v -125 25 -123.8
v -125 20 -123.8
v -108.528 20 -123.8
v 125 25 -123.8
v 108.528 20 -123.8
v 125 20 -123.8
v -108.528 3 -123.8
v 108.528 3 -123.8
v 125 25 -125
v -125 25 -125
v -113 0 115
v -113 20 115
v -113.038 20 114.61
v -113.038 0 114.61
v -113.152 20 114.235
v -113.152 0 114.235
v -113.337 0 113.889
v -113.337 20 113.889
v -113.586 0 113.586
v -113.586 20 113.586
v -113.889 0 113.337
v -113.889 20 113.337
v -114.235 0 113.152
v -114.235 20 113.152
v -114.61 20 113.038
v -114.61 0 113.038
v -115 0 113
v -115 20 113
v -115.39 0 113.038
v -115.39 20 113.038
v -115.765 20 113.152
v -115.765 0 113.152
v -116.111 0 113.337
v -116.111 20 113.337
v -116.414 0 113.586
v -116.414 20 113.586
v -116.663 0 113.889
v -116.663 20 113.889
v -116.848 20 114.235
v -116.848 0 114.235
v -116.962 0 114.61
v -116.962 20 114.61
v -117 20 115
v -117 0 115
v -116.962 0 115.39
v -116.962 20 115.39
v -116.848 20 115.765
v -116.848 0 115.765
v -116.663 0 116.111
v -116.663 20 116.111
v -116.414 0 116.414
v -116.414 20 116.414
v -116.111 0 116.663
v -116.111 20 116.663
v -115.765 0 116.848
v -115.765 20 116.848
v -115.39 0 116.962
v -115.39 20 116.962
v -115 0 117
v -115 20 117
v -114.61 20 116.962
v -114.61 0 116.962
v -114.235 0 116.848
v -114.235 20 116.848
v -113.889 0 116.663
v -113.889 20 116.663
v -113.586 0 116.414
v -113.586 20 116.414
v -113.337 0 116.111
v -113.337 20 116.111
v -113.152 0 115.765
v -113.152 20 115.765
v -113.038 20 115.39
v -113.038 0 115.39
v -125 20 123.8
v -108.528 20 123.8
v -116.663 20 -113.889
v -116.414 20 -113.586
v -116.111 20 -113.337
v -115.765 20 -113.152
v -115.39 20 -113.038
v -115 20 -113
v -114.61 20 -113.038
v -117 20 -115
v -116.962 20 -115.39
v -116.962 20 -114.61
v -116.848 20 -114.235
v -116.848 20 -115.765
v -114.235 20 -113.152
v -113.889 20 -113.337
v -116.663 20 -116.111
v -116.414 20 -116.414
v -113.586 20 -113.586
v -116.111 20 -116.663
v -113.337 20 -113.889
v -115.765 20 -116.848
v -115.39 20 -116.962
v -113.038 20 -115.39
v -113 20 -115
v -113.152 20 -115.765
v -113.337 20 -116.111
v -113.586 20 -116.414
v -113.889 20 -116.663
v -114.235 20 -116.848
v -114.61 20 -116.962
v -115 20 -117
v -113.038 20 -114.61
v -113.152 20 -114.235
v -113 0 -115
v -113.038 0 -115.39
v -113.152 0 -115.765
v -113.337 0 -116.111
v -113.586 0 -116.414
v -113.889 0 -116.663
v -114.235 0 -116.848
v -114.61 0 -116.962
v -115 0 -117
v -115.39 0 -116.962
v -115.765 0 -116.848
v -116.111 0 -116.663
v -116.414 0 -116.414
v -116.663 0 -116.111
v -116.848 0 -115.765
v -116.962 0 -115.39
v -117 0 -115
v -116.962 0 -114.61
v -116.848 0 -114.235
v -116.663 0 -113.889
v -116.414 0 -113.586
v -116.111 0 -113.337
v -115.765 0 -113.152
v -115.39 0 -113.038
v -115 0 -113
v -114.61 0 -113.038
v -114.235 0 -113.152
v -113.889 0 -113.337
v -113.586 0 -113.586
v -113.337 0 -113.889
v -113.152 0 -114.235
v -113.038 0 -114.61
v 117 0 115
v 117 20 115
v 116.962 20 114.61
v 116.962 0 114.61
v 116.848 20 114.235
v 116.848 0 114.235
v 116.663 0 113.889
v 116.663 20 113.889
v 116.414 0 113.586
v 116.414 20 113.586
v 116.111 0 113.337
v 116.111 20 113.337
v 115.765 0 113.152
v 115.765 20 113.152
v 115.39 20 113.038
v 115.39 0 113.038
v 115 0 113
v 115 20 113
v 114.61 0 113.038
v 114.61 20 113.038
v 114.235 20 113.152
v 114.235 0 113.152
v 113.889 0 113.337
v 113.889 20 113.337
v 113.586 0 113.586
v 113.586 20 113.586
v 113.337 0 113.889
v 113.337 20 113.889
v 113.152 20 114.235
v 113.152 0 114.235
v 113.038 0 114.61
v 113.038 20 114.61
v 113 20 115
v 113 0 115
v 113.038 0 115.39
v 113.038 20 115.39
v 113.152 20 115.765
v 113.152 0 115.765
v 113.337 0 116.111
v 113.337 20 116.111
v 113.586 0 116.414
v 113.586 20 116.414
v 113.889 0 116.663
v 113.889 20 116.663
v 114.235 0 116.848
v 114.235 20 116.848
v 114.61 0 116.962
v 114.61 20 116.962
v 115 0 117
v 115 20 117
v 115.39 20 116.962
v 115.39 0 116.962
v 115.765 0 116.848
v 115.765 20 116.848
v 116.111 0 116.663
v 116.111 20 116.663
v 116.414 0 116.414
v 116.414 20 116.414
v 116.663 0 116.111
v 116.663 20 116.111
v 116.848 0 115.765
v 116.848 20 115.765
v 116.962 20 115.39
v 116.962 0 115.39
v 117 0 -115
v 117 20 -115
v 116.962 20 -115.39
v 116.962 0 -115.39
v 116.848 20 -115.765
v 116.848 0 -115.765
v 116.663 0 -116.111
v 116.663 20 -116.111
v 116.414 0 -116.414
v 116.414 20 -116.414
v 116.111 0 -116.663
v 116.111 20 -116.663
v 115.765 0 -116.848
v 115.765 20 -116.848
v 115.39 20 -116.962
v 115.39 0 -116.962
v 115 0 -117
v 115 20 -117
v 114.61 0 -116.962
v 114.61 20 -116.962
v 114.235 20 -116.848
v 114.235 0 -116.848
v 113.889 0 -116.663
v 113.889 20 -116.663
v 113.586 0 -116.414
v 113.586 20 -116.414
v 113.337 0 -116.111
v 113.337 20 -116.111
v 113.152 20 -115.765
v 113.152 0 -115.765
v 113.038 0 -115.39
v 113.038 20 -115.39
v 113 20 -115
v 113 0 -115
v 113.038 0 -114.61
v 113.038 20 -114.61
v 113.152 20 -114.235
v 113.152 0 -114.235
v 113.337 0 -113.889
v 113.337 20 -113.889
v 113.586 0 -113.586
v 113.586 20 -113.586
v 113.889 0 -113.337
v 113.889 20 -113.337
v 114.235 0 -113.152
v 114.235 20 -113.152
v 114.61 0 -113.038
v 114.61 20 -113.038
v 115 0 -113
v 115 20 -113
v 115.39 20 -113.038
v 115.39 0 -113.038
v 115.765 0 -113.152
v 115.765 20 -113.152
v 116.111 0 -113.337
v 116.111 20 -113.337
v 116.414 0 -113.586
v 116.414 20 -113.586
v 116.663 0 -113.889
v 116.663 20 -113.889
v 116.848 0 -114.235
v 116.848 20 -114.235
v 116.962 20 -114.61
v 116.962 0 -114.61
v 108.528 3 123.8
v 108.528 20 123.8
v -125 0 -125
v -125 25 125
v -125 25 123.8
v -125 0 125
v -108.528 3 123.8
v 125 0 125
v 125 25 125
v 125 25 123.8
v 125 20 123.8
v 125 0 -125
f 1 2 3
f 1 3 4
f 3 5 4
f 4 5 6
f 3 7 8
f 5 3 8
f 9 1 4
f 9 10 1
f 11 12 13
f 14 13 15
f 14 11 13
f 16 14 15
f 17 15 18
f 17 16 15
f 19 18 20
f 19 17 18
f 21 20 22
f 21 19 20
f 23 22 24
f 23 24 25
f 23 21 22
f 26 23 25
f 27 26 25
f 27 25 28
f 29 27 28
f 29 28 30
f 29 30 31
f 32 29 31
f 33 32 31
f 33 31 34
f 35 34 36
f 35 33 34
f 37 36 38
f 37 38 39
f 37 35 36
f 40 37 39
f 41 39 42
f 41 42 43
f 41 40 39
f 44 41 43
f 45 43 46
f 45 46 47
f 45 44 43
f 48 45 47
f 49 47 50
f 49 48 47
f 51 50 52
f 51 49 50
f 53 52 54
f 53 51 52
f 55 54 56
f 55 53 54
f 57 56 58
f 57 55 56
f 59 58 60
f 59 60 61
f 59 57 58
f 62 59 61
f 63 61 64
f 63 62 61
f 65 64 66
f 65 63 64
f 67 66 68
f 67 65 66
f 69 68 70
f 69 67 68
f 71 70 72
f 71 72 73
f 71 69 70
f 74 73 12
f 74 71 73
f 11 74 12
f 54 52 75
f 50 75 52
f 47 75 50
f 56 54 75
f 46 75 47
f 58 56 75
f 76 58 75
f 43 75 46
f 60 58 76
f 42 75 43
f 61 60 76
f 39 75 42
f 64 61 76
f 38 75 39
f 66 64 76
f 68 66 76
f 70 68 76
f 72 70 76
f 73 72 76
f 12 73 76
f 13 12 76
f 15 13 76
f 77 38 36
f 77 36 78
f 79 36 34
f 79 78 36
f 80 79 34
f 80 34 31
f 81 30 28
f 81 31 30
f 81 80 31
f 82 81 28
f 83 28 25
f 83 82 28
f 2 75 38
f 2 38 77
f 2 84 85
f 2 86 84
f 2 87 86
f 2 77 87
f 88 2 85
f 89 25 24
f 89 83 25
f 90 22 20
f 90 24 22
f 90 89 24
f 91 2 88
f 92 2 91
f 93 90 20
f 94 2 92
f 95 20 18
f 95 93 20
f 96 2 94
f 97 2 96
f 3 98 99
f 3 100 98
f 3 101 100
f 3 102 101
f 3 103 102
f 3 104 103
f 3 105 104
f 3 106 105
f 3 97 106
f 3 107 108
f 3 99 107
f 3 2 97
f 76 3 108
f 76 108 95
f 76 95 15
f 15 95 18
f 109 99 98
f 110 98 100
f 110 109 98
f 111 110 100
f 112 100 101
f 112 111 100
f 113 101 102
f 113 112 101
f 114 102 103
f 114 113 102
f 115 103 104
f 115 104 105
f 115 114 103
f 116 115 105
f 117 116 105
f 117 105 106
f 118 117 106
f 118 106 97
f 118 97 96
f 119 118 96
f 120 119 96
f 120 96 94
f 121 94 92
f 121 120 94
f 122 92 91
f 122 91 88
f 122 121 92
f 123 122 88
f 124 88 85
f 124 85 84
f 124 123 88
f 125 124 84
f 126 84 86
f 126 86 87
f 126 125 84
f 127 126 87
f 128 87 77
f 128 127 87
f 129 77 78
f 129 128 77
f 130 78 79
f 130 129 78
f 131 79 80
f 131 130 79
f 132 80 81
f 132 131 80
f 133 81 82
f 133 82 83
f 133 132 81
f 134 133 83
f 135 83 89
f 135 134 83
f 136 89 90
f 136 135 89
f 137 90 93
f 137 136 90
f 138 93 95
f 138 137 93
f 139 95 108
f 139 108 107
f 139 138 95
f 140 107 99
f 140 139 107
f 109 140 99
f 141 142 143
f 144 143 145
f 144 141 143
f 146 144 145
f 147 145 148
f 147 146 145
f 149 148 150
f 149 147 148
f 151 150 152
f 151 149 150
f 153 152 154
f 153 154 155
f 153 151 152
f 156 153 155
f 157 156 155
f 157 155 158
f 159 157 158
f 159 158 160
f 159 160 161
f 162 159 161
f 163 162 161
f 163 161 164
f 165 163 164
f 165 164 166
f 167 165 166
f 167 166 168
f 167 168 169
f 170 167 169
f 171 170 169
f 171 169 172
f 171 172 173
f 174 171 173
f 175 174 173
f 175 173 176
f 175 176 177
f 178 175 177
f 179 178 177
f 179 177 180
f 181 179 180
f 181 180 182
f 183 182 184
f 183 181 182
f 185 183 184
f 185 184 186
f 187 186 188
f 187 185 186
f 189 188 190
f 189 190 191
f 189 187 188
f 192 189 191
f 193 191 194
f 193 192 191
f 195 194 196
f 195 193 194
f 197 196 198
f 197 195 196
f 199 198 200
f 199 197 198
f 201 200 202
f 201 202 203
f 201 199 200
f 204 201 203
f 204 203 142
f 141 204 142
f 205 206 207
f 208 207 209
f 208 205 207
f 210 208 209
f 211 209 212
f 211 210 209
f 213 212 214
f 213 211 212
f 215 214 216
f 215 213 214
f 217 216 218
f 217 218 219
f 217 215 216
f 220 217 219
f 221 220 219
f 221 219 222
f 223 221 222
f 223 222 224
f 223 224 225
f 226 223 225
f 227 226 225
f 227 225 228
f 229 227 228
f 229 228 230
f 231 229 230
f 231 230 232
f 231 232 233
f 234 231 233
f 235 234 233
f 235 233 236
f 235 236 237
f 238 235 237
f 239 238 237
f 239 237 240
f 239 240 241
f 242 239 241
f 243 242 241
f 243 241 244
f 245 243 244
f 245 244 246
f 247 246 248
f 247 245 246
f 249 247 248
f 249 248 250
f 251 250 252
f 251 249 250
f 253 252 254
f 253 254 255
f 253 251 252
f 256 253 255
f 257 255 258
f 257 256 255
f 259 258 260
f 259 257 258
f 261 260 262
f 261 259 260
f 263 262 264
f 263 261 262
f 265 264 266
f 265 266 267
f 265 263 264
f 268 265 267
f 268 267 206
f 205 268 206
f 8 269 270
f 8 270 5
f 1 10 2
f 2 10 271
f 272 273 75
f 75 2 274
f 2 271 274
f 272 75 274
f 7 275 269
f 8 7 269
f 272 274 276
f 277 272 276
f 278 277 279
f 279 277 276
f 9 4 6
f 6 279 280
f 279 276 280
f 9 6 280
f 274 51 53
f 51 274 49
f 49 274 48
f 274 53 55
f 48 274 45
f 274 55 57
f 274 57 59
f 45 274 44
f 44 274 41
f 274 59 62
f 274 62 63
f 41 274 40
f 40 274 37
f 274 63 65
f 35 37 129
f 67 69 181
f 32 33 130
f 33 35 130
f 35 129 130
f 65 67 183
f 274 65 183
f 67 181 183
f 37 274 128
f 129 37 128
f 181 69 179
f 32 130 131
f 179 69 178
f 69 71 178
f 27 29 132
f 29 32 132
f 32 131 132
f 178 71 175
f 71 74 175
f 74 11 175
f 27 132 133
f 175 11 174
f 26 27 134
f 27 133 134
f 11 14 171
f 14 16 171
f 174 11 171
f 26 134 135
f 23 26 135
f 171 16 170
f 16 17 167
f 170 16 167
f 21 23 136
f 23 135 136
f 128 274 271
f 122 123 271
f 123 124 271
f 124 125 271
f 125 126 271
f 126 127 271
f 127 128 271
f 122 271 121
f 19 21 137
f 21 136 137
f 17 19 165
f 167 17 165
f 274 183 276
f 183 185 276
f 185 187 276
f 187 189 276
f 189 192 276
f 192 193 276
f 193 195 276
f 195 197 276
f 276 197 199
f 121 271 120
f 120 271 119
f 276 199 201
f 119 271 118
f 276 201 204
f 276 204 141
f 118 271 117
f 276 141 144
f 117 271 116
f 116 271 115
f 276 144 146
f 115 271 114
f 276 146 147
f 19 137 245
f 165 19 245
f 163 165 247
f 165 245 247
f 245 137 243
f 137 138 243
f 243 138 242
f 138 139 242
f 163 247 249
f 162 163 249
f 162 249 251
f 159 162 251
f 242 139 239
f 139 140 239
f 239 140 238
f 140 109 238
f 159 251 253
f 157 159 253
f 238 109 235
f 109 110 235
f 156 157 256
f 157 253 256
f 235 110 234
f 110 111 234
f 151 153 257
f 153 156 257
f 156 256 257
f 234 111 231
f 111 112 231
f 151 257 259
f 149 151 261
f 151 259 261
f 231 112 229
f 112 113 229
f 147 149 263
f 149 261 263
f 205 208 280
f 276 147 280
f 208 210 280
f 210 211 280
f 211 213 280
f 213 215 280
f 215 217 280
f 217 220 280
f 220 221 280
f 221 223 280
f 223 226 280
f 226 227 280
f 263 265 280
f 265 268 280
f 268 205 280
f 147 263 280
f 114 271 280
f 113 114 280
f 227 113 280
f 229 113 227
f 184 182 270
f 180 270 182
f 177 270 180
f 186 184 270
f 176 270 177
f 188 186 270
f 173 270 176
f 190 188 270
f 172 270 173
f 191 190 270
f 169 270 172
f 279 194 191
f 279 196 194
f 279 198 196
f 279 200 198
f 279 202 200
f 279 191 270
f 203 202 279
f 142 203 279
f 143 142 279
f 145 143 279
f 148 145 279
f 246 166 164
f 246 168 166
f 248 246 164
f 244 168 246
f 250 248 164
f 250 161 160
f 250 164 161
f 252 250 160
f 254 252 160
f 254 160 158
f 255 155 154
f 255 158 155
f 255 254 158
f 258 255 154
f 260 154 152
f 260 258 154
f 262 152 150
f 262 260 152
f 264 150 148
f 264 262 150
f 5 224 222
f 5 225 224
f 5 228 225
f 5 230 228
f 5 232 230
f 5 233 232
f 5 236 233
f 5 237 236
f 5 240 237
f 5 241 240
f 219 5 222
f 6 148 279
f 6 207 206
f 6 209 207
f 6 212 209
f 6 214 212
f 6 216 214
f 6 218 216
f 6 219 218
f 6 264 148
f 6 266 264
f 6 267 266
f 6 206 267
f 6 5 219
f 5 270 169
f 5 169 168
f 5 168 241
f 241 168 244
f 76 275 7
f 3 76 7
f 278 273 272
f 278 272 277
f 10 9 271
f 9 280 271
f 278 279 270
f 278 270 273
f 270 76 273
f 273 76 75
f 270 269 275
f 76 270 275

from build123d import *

# Parameters (mm, degrees)
ESBO_O1_W                = 250
ESBO_O1_H                = 250
ESBO_O1_R                = 2
RESSALTO_EXTRUS_O1_DEPTH = 3
ESBO_O2_W                = 16.471941672
ESBO_O2_H                = 247.6
ESBO_O2_R                = 2
RESSALTO_EXTRUS_O2_DEPTH = 17
ESBO_O2_5_W              = 250
ESBO_O2_5_H              = 1.2
RESSALTO_EXTRUS_O3_DEPTH = 22


with BuildPart() as part:
    # Esboço1 → Ressalto-extrusão1 (new body)
    with BuildSketch(Plane(origin=(0, 0, 0), x_dir=(1, 0, 0), z_dir=(0, 1, 0))):
        Rectangle(ESBO_O1_W, ESBO_O1_H)
        with Locations((-115, 115)):
            Circle(ESBO_O1_R, mode=Mode.SUBTRACT)
        with Locations((115, 115)):
            Circle(ESBO_O1_R, mode=Mode.SUBTRACT)
        with Locations((-115, -115)):
            Circle(ESBO_O1_R, mode=Mode.SUBTRACT)
        with Locations((115, -115)):
            Circle(ESBO_O1_R, mode=Mode.SUBTRACT)
    extrude(amount=RESSALTO_EXTRUS_O1_DEPTH)

    # Esboço2 → Ressalto-extrusão2 (add)
    # profile 1 of 2: a face of its own
    with BuildSketch(Plane(origin=(0, 3, 0), x_dir=(1, 0, 0), z_dir=(0, 1, 0))):
        with Locations((-116.764029164, 0)):
            Rectangle(ESBO_O2_W, ESBO_O2_H)
        with Locations((-115, -115)):
            Circle(ESBO_O2_R, mode=Mode.SUBTRACT)
        with Locations((-115, 115)):
            Circle(ESBO_O2_R, mode=Mode.SUBTRACT)
    # profile 2 of 2: a face of its own
    with BuildSketch(Plane(origin=(0, 3, 0), x_dir=(1, 0, 0), z_dir=(0, 1, 0))):
        with Locations((116.764029164, 0)):
            Rectangle(ESBO_O2_W, ESBO_O2_H)
        with Locations((115, -115)):
            Circle(ESBO_O2_R, mode=Mode.SUBTRACT)
        with Locations((115, 115)):
            Circle(ESBO_O2_R, mode=Mode.SUBTRACT)
    extrude(amount=RESSALTO_EXTRUS_O2_DEPTH)

    # Esboço2<5> → Ressalto-extrusão3 (add)
    with BuildSketch(Plane(origin=(0, 3, 0), x_dir=(1, 0, 0), z_dir=(0, 1, 0))):
        with Locations((0, 124.4)):
            Rectangle(ESBO_O2_5_W, ESBO_O2_5_H)
        with Locations((0, -124.4)):
            Rectangle(ESBO_O2_5_W, ESBO_O2_5_H)
    extrude(amount=RESSALTO_EXTRUS_O3_DEPTH)


solid = part.part
